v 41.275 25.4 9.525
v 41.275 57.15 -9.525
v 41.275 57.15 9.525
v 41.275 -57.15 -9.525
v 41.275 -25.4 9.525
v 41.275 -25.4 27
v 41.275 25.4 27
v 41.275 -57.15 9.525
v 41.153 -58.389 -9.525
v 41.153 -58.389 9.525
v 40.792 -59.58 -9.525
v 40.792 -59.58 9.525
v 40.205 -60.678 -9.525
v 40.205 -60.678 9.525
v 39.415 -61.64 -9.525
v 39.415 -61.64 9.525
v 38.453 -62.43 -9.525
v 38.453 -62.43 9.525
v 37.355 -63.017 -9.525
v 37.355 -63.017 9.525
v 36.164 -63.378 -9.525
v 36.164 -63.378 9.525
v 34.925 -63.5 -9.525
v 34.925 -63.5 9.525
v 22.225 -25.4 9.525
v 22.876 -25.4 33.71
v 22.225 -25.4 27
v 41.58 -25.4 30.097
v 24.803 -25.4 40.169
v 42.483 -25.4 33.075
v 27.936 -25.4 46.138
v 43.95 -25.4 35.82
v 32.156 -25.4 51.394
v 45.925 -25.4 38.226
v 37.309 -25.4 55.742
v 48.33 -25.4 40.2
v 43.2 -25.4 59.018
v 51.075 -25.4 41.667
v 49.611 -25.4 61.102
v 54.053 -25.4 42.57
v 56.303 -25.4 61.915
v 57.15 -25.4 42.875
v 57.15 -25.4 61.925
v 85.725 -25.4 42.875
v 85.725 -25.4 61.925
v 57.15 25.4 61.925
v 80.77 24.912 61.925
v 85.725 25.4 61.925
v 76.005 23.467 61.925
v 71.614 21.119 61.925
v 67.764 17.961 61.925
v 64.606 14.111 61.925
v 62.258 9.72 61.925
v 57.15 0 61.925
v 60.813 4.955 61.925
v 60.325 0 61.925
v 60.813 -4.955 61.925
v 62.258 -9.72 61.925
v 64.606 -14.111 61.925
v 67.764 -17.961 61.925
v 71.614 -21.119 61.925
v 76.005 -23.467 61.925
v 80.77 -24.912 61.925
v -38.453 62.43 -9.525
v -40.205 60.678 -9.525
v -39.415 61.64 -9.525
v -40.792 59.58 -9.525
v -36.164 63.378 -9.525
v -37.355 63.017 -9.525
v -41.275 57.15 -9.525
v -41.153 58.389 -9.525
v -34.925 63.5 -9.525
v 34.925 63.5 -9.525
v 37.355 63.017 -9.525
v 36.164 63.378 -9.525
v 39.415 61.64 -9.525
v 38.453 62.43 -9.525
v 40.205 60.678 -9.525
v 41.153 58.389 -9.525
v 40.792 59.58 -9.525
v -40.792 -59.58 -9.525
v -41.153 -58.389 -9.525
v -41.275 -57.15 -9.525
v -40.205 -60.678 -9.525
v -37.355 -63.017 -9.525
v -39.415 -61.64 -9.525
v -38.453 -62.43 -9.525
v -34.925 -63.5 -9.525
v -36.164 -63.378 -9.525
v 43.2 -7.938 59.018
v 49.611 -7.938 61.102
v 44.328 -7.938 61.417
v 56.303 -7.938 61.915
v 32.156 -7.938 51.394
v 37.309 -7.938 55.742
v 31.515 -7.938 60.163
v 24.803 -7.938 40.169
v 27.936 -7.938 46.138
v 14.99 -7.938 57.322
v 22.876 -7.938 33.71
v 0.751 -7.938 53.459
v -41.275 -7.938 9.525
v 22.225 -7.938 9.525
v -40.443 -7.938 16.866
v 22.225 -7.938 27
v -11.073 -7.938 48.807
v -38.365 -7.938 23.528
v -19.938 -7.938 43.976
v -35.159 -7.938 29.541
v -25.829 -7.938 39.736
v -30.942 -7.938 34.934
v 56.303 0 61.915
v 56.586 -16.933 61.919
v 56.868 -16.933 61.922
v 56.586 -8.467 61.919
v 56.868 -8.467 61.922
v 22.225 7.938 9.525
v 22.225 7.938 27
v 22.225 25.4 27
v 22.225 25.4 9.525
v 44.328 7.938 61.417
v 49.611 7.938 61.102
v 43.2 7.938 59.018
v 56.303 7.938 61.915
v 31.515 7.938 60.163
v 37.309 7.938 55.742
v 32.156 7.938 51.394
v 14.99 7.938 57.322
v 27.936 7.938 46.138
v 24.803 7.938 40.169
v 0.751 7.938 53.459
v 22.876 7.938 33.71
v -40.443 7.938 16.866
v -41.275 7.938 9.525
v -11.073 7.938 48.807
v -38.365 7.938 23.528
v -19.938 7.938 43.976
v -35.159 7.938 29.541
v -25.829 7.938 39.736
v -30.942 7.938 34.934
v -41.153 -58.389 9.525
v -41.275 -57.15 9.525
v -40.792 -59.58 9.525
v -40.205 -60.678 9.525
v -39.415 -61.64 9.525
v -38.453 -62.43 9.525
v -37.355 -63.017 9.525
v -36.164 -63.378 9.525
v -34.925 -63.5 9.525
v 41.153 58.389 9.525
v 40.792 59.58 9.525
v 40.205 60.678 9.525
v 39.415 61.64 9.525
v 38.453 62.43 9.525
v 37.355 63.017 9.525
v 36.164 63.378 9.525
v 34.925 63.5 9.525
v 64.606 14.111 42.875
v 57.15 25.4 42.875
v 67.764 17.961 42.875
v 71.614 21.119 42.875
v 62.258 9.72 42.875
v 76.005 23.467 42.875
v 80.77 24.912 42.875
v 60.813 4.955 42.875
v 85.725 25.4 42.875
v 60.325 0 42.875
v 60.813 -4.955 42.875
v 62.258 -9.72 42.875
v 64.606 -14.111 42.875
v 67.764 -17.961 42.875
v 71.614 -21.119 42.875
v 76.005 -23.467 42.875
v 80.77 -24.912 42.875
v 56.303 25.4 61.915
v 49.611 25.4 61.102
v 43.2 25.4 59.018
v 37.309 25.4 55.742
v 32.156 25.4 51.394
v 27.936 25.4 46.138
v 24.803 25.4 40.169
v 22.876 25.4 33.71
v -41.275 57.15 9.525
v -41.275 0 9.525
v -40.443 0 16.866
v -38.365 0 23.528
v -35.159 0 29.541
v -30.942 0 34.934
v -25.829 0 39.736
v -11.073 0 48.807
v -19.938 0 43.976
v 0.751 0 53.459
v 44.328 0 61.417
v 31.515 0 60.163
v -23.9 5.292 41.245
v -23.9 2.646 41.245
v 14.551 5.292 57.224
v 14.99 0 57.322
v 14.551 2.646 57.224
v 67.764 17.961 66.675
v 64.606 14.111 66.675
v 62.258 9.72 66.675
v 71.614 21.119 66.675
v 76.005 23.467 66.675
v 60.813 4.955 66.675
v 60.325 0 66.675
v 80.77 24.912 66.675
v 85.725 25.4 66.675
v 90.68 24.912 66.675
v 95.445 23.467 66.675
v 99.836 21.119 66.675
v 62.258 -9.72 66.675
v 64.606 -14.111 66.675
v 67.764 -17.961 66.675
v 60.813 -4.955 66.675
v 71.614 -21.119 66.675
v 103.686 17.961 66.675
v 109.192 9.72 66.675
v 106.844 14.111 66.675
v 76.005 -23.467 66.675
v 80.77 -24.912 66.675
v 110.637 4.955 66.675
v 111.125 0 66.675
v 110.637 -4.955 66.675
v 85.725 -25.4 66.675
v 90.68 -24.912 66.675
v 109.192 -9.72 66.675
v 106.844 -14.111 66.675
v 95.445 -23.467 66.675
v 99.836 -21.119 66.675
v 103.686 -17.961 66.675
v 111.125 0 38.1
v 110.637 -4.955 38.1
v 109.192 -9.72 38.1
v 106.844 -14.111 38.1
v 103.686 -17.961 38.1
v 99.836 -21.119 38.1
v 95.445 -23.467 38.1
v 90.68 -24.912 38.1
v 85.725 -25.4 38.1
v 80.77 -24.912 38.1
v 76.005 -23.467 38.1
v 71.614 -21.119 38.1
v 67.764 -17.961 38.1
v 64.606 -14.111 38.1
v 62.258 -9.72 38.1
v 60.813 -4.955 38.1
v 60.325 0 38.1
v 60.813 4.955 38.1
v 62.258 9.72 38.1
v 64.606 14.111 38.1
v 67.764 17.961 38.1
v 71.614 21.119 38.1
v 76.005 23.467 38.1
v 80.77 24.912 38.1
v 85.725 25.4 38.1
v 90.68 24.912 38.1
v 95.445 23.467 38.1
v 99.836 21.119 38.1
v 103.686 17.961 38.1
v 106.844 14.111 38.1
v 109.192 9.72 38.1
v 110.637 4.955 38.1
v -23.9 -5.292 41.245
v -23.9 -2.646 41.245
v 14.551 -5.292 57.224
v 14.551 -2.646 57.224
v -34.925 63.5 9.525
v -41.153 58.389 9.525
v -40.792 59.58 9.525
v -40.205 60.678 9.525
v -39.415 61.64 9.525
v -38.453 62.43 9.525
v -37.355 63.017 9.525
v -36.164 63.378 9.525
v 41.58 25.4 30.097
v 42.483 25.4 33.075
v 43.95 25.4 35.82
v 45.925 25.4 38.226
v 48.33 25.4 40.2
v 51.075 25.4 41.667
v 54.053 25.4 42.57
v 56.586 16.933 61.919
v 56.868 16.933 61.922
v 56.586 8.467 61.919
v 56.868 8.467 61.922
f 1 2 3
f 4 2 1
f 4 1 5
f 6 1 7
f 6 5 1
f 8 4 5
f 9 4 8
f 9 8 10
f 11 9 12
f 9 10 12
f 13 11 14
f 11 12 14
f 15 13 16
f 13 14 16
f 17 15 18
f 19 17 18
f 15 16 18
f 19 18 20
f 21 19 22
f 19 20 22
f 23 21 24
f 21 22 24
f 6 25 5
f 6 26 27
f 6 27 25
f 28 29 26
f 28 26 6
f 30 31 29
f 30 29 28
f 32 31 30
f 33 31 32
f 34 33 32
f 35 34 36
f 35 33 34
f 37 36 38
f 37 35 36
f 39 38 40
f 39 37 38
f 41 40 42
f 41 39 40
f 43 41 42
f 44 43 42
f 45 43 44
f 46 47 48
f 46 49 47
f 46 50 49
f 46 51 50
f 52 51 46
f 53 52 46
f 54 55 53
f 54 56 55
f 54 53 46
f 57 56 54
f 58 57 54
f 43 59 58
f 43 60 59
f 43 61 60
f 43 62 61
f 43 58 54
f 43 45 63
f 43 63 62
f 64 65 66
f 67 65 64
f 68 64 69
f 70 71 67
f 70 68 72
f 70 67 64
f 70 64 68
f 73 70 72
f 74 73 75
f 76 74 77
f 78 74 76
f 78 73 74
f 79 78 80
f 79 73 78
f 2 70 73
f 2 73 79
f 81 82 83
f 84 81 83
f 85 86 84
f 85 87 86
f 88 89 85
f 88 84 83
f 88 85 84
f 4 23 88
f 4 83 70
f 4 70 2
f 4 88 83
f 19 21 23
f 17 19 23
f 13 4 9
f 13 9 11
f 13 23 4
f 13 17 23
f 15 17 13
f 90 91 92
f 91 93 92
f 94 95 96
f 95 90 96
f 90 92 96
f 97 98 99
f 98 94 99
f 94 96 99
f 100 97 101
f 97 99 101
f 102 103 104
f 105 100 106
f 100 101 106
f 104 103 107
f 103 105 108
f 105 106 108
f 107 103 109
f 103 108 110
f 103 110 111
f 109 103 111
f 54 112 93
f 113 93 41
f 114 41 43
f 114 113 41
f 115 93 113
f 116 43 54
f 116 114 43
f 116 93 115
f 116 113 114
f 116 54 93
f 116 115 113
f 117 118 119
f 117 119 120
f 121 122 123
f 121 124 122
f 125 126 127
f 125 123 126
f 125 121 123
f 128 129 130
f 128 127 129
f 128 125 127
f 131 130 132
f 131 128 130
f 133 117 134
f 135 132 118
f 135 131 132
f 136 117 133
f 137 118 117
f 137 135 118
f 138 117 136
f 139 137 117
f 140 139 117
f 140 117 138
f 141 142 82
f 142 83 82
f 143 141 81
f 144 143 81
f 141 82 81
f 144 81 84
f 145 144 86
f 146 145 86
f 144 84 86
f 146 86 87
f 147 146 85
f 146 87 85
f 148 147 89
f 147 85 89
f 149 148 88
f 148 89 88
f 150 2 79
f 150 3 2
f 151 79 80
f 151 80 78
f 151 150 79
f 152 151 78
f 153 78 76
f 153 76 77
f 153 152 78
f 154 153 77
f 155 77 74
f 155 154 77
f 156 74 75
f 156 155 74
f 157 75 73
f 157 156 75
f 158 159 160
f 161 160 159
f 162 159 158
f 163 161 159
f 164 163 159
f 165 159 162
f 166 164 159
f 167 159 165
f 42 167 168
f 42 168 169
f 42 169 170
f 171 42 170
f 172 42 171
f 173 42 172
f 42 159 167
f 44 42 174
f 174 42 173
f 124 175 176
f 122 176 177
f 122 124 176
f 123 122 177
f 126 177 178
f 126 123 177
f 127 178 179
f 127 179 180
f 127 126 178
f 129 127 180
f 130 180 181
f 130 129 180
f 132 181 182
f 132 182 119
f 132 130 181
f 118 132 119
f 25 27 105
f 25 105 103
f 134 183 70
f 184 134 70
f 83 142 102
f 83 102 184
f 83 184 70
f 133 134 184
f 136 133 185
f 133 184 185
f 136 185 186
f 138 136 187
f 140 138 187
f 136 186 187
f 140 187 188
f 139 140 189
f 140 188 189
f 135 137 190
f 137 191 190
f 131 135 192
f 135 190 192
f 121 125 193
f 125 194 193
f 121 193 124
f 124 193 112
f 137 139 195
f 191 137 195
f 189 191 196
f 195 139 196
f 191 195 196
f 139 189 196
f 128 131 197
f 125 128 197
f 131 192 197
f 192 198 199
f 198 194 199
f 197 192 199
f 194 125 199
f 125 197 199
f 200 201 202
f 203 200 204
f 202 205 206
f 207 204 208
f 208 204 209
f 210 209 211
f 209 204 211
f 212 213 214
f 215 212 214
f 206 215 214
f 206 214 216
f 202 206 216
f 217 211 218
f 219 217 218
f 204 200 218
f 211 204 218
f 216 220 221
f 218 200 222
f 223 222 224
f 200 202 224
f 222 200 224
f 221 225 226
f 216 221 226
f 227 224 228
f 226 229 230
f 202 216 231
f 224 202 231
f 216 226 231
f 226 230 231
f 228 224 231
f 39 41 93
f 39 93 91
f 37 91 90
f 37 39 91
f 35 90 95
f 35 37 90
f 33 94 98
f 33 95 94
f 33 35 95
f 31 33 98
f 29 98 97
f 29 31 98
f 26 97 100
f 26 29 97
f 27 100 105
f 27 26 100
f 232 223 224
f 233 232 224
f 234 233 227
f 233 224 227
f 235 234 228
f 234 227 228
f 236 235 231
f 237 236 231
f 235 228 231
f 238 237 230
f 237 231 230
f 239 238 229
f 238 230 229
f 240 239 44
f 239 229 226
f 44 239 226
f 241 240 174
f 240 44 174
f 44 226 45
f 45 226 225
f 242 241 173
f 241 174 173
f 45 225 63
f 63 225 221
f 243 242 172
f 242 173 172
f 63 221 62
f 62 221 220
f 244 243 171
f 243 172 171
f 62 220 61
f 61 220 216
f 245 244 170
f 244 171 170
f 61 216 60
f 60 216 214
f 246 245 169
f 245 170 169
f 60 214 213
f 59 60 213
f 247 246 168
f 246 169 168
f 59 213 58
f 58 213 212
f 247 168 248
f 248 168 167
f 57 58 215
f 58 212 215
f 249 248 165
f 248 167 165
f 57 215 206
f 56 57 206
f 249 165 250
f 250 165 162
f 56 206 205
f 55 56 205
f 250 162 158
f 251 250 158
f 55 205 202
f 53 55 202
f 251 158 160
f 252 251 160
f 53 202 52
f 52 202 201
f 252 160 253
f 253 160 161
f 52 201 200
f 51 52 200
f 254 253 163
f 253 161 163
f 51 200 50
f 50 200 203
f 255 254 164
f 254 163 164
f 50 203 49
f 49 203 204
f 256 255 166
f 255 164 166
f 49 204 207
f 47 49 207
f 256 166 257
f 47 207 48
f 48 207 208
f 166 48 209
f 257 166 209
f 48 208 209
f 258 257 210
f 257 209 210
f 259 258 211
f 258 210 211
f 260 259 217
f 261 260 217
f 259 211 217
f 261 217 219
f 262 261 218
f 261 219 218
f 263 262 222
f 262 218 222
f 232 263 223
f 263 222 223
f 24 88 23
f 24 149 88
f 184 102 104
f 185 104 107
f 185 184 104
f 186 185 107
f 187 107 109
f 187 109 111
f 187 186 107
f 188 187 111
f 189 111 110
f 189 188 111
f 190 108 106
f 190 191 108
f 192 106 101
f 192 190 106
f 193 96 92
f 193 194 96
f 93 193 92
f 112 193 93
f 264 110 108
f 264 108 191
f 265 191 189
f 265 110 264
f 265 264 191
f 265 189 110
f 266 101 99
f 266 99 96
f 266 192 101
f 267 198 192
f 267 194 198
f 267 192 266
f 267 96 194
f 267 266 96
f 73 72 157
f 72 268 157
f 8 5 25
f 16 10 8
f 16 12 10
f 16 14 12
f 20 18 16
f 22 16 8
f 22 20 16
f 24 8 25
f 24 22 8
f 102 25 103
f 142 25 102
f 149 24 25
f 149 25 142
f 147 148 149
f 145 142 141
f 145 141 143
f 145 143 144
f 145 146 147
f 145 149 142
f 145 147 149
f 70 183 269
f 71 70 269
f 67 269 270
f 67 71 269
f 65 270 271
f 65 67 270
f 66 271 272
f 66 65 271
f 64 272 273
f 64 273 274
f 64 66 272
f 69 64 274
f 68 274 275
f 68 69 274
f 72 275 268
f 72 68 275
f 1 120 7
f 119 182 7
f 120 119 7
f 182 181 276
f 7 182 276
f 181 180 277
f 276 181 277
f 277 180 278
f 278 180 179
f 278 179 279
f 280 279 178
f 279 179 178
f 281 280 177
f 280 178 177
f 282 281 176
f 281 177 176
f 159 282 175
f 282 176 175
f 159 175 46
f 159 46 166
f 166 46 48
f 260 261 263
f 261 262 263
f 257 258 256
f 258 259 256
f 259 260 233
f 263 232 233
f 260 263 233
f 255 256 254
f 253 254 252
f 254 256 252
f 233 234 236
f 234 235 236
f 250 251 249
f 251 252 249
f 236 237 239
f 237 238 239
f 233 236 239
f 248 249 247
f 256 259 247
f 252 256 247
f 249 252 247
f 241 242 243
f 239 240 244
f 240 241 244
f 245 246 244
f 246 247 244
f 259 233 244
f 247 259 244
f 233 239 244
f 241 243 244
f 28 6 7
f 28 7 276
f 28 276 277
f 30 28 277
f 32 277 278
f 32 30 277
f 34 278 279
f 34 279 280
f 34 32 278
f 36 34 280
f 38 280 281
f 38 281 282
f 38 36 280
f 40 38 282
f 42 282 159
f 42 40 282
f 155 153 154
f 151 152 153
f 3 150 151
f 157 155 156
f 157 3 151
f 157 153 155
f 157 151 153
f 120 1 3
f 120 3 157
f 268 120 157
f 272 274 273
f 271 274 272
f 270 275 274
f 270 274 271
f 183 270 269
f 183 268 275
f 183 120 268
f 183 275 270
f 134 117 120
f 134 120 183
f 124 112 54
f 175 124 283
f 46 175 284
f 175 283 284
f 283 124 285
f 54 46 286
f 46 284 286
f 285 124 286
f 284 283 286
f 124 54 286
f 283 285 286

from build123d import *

# Parameters (mm, degrees)
F1_DEPTH = 63.5
F0_W     = 25.4
F0_H     = 19.05
F2_DEPTH = 25.4
F3_DEPTH = 7.9375
F5_R     = 6.35


# Not quite as in the source:
# - a feature names something its author has since deleted; it is built from what else it names


with BuildPart() as f1:
    # F0 (on Front) → F1 (new body, symmetric)
    with BuildSketch(Plane.XZ):
        Polygon((-41.275, -9.525), (41.275, -9.525), (41.275, 9.525), (22.225, 9.525), (-41.275, 9.525), align=None)
    extrude(amount=F1_DEPTH, both=True)

    # F0 (on Front) → F2 (join, symmetric)
    with BuildSketch(Plane.XZ):
        with BuildLine():
            Line((22.225, 9.525), (41.275, 9.525))
            Line((41.275, 9.525), (41.275, 27.0002))
            ThreePointArc((41.275, 27.0002), (45.9246798487, 38.2255201513), (57.15, 42.8752))
            Line((57.15, 42.8752), (60.325, 42.8752))
            Line((60.325, 42.8752), (60.325, 61.9252))
            Line((60.325, 61.9252), (57.15, 61.9252))
            add(Edge.make_bspline(
                [(56.3025201656, 61.914916137), (56.5862693172, 61.9189290335), (56.8687741652, 61.9223540897), (57.15, 61.9252)],
                knots=[110.666674481, 110.666674481, 110.666674481, 110.666674481, 111.5045361635, 111.5045361635, 111.5045361635, 111.5045361635], degree=3))
            ThreePointArc((56.3025201656, 61.914916137), (32.156462253, 51.3944348905), (22.225, 27.0002))
            Line((22.225, 27.0002), (22.225, 9.525))
        make_face()
        with Locations((73.025, 52.4002)):
            Rectangle(F0_W, F0_H)
    extrude(amount=F2_DEPTH, both=True)

    # F0 (on Front) → F3 (join, symmetric)
    with BuildSketch(Plane.XZ):
        with BuildLine():
            add(Edge.make_bspline(
                [(-41.275, 9.525), (-40.3617250948, 50.5995517259), (18.8242875965, 61.3848836588), (56.3025201656, 61.914916137)],
                knots=[0, 0, 0, 0, 110.666674481, 110.666674481, 110.666674481, 110.666674481], degree=3))
            Line((-41.275, 9.525), (22.225, 9.525))
            Line((22.225, 9.525), (22.225, 27.0002))
            ThreePointArc((22.225, 27.0002), (32.156462253, 51.3944348905), (56.3025201656, 61.914916137))
        make_face()
    extrude(amount=F3_DEPTH, both=True)

    # F0 (on Front) → F4 (revolve)
    with BuildSketch(Plane.XZ):
        Polygon((85.725, 61.9252), (85.725, 42.8752), (85.725, 38.1), (111.125, 38.1), (111.125, 66.675), (85.725, 66.675), align=None)
    revolve(axis=Axis((85.725, 0, 52.3875), (0, 0, -1)))

    # F5
    f5_edges = [f1.edges().sort_by_distance(p)[0] for p in [
        (-41.275, -63.5, 0),
        (41.275, -63.5, 0),
        (41.275, 63.5, 0),
        (-41.275, 63.5, 0),
    ]]
    fillet(f5_edges, radius=F5_R)


solid = f1.part
